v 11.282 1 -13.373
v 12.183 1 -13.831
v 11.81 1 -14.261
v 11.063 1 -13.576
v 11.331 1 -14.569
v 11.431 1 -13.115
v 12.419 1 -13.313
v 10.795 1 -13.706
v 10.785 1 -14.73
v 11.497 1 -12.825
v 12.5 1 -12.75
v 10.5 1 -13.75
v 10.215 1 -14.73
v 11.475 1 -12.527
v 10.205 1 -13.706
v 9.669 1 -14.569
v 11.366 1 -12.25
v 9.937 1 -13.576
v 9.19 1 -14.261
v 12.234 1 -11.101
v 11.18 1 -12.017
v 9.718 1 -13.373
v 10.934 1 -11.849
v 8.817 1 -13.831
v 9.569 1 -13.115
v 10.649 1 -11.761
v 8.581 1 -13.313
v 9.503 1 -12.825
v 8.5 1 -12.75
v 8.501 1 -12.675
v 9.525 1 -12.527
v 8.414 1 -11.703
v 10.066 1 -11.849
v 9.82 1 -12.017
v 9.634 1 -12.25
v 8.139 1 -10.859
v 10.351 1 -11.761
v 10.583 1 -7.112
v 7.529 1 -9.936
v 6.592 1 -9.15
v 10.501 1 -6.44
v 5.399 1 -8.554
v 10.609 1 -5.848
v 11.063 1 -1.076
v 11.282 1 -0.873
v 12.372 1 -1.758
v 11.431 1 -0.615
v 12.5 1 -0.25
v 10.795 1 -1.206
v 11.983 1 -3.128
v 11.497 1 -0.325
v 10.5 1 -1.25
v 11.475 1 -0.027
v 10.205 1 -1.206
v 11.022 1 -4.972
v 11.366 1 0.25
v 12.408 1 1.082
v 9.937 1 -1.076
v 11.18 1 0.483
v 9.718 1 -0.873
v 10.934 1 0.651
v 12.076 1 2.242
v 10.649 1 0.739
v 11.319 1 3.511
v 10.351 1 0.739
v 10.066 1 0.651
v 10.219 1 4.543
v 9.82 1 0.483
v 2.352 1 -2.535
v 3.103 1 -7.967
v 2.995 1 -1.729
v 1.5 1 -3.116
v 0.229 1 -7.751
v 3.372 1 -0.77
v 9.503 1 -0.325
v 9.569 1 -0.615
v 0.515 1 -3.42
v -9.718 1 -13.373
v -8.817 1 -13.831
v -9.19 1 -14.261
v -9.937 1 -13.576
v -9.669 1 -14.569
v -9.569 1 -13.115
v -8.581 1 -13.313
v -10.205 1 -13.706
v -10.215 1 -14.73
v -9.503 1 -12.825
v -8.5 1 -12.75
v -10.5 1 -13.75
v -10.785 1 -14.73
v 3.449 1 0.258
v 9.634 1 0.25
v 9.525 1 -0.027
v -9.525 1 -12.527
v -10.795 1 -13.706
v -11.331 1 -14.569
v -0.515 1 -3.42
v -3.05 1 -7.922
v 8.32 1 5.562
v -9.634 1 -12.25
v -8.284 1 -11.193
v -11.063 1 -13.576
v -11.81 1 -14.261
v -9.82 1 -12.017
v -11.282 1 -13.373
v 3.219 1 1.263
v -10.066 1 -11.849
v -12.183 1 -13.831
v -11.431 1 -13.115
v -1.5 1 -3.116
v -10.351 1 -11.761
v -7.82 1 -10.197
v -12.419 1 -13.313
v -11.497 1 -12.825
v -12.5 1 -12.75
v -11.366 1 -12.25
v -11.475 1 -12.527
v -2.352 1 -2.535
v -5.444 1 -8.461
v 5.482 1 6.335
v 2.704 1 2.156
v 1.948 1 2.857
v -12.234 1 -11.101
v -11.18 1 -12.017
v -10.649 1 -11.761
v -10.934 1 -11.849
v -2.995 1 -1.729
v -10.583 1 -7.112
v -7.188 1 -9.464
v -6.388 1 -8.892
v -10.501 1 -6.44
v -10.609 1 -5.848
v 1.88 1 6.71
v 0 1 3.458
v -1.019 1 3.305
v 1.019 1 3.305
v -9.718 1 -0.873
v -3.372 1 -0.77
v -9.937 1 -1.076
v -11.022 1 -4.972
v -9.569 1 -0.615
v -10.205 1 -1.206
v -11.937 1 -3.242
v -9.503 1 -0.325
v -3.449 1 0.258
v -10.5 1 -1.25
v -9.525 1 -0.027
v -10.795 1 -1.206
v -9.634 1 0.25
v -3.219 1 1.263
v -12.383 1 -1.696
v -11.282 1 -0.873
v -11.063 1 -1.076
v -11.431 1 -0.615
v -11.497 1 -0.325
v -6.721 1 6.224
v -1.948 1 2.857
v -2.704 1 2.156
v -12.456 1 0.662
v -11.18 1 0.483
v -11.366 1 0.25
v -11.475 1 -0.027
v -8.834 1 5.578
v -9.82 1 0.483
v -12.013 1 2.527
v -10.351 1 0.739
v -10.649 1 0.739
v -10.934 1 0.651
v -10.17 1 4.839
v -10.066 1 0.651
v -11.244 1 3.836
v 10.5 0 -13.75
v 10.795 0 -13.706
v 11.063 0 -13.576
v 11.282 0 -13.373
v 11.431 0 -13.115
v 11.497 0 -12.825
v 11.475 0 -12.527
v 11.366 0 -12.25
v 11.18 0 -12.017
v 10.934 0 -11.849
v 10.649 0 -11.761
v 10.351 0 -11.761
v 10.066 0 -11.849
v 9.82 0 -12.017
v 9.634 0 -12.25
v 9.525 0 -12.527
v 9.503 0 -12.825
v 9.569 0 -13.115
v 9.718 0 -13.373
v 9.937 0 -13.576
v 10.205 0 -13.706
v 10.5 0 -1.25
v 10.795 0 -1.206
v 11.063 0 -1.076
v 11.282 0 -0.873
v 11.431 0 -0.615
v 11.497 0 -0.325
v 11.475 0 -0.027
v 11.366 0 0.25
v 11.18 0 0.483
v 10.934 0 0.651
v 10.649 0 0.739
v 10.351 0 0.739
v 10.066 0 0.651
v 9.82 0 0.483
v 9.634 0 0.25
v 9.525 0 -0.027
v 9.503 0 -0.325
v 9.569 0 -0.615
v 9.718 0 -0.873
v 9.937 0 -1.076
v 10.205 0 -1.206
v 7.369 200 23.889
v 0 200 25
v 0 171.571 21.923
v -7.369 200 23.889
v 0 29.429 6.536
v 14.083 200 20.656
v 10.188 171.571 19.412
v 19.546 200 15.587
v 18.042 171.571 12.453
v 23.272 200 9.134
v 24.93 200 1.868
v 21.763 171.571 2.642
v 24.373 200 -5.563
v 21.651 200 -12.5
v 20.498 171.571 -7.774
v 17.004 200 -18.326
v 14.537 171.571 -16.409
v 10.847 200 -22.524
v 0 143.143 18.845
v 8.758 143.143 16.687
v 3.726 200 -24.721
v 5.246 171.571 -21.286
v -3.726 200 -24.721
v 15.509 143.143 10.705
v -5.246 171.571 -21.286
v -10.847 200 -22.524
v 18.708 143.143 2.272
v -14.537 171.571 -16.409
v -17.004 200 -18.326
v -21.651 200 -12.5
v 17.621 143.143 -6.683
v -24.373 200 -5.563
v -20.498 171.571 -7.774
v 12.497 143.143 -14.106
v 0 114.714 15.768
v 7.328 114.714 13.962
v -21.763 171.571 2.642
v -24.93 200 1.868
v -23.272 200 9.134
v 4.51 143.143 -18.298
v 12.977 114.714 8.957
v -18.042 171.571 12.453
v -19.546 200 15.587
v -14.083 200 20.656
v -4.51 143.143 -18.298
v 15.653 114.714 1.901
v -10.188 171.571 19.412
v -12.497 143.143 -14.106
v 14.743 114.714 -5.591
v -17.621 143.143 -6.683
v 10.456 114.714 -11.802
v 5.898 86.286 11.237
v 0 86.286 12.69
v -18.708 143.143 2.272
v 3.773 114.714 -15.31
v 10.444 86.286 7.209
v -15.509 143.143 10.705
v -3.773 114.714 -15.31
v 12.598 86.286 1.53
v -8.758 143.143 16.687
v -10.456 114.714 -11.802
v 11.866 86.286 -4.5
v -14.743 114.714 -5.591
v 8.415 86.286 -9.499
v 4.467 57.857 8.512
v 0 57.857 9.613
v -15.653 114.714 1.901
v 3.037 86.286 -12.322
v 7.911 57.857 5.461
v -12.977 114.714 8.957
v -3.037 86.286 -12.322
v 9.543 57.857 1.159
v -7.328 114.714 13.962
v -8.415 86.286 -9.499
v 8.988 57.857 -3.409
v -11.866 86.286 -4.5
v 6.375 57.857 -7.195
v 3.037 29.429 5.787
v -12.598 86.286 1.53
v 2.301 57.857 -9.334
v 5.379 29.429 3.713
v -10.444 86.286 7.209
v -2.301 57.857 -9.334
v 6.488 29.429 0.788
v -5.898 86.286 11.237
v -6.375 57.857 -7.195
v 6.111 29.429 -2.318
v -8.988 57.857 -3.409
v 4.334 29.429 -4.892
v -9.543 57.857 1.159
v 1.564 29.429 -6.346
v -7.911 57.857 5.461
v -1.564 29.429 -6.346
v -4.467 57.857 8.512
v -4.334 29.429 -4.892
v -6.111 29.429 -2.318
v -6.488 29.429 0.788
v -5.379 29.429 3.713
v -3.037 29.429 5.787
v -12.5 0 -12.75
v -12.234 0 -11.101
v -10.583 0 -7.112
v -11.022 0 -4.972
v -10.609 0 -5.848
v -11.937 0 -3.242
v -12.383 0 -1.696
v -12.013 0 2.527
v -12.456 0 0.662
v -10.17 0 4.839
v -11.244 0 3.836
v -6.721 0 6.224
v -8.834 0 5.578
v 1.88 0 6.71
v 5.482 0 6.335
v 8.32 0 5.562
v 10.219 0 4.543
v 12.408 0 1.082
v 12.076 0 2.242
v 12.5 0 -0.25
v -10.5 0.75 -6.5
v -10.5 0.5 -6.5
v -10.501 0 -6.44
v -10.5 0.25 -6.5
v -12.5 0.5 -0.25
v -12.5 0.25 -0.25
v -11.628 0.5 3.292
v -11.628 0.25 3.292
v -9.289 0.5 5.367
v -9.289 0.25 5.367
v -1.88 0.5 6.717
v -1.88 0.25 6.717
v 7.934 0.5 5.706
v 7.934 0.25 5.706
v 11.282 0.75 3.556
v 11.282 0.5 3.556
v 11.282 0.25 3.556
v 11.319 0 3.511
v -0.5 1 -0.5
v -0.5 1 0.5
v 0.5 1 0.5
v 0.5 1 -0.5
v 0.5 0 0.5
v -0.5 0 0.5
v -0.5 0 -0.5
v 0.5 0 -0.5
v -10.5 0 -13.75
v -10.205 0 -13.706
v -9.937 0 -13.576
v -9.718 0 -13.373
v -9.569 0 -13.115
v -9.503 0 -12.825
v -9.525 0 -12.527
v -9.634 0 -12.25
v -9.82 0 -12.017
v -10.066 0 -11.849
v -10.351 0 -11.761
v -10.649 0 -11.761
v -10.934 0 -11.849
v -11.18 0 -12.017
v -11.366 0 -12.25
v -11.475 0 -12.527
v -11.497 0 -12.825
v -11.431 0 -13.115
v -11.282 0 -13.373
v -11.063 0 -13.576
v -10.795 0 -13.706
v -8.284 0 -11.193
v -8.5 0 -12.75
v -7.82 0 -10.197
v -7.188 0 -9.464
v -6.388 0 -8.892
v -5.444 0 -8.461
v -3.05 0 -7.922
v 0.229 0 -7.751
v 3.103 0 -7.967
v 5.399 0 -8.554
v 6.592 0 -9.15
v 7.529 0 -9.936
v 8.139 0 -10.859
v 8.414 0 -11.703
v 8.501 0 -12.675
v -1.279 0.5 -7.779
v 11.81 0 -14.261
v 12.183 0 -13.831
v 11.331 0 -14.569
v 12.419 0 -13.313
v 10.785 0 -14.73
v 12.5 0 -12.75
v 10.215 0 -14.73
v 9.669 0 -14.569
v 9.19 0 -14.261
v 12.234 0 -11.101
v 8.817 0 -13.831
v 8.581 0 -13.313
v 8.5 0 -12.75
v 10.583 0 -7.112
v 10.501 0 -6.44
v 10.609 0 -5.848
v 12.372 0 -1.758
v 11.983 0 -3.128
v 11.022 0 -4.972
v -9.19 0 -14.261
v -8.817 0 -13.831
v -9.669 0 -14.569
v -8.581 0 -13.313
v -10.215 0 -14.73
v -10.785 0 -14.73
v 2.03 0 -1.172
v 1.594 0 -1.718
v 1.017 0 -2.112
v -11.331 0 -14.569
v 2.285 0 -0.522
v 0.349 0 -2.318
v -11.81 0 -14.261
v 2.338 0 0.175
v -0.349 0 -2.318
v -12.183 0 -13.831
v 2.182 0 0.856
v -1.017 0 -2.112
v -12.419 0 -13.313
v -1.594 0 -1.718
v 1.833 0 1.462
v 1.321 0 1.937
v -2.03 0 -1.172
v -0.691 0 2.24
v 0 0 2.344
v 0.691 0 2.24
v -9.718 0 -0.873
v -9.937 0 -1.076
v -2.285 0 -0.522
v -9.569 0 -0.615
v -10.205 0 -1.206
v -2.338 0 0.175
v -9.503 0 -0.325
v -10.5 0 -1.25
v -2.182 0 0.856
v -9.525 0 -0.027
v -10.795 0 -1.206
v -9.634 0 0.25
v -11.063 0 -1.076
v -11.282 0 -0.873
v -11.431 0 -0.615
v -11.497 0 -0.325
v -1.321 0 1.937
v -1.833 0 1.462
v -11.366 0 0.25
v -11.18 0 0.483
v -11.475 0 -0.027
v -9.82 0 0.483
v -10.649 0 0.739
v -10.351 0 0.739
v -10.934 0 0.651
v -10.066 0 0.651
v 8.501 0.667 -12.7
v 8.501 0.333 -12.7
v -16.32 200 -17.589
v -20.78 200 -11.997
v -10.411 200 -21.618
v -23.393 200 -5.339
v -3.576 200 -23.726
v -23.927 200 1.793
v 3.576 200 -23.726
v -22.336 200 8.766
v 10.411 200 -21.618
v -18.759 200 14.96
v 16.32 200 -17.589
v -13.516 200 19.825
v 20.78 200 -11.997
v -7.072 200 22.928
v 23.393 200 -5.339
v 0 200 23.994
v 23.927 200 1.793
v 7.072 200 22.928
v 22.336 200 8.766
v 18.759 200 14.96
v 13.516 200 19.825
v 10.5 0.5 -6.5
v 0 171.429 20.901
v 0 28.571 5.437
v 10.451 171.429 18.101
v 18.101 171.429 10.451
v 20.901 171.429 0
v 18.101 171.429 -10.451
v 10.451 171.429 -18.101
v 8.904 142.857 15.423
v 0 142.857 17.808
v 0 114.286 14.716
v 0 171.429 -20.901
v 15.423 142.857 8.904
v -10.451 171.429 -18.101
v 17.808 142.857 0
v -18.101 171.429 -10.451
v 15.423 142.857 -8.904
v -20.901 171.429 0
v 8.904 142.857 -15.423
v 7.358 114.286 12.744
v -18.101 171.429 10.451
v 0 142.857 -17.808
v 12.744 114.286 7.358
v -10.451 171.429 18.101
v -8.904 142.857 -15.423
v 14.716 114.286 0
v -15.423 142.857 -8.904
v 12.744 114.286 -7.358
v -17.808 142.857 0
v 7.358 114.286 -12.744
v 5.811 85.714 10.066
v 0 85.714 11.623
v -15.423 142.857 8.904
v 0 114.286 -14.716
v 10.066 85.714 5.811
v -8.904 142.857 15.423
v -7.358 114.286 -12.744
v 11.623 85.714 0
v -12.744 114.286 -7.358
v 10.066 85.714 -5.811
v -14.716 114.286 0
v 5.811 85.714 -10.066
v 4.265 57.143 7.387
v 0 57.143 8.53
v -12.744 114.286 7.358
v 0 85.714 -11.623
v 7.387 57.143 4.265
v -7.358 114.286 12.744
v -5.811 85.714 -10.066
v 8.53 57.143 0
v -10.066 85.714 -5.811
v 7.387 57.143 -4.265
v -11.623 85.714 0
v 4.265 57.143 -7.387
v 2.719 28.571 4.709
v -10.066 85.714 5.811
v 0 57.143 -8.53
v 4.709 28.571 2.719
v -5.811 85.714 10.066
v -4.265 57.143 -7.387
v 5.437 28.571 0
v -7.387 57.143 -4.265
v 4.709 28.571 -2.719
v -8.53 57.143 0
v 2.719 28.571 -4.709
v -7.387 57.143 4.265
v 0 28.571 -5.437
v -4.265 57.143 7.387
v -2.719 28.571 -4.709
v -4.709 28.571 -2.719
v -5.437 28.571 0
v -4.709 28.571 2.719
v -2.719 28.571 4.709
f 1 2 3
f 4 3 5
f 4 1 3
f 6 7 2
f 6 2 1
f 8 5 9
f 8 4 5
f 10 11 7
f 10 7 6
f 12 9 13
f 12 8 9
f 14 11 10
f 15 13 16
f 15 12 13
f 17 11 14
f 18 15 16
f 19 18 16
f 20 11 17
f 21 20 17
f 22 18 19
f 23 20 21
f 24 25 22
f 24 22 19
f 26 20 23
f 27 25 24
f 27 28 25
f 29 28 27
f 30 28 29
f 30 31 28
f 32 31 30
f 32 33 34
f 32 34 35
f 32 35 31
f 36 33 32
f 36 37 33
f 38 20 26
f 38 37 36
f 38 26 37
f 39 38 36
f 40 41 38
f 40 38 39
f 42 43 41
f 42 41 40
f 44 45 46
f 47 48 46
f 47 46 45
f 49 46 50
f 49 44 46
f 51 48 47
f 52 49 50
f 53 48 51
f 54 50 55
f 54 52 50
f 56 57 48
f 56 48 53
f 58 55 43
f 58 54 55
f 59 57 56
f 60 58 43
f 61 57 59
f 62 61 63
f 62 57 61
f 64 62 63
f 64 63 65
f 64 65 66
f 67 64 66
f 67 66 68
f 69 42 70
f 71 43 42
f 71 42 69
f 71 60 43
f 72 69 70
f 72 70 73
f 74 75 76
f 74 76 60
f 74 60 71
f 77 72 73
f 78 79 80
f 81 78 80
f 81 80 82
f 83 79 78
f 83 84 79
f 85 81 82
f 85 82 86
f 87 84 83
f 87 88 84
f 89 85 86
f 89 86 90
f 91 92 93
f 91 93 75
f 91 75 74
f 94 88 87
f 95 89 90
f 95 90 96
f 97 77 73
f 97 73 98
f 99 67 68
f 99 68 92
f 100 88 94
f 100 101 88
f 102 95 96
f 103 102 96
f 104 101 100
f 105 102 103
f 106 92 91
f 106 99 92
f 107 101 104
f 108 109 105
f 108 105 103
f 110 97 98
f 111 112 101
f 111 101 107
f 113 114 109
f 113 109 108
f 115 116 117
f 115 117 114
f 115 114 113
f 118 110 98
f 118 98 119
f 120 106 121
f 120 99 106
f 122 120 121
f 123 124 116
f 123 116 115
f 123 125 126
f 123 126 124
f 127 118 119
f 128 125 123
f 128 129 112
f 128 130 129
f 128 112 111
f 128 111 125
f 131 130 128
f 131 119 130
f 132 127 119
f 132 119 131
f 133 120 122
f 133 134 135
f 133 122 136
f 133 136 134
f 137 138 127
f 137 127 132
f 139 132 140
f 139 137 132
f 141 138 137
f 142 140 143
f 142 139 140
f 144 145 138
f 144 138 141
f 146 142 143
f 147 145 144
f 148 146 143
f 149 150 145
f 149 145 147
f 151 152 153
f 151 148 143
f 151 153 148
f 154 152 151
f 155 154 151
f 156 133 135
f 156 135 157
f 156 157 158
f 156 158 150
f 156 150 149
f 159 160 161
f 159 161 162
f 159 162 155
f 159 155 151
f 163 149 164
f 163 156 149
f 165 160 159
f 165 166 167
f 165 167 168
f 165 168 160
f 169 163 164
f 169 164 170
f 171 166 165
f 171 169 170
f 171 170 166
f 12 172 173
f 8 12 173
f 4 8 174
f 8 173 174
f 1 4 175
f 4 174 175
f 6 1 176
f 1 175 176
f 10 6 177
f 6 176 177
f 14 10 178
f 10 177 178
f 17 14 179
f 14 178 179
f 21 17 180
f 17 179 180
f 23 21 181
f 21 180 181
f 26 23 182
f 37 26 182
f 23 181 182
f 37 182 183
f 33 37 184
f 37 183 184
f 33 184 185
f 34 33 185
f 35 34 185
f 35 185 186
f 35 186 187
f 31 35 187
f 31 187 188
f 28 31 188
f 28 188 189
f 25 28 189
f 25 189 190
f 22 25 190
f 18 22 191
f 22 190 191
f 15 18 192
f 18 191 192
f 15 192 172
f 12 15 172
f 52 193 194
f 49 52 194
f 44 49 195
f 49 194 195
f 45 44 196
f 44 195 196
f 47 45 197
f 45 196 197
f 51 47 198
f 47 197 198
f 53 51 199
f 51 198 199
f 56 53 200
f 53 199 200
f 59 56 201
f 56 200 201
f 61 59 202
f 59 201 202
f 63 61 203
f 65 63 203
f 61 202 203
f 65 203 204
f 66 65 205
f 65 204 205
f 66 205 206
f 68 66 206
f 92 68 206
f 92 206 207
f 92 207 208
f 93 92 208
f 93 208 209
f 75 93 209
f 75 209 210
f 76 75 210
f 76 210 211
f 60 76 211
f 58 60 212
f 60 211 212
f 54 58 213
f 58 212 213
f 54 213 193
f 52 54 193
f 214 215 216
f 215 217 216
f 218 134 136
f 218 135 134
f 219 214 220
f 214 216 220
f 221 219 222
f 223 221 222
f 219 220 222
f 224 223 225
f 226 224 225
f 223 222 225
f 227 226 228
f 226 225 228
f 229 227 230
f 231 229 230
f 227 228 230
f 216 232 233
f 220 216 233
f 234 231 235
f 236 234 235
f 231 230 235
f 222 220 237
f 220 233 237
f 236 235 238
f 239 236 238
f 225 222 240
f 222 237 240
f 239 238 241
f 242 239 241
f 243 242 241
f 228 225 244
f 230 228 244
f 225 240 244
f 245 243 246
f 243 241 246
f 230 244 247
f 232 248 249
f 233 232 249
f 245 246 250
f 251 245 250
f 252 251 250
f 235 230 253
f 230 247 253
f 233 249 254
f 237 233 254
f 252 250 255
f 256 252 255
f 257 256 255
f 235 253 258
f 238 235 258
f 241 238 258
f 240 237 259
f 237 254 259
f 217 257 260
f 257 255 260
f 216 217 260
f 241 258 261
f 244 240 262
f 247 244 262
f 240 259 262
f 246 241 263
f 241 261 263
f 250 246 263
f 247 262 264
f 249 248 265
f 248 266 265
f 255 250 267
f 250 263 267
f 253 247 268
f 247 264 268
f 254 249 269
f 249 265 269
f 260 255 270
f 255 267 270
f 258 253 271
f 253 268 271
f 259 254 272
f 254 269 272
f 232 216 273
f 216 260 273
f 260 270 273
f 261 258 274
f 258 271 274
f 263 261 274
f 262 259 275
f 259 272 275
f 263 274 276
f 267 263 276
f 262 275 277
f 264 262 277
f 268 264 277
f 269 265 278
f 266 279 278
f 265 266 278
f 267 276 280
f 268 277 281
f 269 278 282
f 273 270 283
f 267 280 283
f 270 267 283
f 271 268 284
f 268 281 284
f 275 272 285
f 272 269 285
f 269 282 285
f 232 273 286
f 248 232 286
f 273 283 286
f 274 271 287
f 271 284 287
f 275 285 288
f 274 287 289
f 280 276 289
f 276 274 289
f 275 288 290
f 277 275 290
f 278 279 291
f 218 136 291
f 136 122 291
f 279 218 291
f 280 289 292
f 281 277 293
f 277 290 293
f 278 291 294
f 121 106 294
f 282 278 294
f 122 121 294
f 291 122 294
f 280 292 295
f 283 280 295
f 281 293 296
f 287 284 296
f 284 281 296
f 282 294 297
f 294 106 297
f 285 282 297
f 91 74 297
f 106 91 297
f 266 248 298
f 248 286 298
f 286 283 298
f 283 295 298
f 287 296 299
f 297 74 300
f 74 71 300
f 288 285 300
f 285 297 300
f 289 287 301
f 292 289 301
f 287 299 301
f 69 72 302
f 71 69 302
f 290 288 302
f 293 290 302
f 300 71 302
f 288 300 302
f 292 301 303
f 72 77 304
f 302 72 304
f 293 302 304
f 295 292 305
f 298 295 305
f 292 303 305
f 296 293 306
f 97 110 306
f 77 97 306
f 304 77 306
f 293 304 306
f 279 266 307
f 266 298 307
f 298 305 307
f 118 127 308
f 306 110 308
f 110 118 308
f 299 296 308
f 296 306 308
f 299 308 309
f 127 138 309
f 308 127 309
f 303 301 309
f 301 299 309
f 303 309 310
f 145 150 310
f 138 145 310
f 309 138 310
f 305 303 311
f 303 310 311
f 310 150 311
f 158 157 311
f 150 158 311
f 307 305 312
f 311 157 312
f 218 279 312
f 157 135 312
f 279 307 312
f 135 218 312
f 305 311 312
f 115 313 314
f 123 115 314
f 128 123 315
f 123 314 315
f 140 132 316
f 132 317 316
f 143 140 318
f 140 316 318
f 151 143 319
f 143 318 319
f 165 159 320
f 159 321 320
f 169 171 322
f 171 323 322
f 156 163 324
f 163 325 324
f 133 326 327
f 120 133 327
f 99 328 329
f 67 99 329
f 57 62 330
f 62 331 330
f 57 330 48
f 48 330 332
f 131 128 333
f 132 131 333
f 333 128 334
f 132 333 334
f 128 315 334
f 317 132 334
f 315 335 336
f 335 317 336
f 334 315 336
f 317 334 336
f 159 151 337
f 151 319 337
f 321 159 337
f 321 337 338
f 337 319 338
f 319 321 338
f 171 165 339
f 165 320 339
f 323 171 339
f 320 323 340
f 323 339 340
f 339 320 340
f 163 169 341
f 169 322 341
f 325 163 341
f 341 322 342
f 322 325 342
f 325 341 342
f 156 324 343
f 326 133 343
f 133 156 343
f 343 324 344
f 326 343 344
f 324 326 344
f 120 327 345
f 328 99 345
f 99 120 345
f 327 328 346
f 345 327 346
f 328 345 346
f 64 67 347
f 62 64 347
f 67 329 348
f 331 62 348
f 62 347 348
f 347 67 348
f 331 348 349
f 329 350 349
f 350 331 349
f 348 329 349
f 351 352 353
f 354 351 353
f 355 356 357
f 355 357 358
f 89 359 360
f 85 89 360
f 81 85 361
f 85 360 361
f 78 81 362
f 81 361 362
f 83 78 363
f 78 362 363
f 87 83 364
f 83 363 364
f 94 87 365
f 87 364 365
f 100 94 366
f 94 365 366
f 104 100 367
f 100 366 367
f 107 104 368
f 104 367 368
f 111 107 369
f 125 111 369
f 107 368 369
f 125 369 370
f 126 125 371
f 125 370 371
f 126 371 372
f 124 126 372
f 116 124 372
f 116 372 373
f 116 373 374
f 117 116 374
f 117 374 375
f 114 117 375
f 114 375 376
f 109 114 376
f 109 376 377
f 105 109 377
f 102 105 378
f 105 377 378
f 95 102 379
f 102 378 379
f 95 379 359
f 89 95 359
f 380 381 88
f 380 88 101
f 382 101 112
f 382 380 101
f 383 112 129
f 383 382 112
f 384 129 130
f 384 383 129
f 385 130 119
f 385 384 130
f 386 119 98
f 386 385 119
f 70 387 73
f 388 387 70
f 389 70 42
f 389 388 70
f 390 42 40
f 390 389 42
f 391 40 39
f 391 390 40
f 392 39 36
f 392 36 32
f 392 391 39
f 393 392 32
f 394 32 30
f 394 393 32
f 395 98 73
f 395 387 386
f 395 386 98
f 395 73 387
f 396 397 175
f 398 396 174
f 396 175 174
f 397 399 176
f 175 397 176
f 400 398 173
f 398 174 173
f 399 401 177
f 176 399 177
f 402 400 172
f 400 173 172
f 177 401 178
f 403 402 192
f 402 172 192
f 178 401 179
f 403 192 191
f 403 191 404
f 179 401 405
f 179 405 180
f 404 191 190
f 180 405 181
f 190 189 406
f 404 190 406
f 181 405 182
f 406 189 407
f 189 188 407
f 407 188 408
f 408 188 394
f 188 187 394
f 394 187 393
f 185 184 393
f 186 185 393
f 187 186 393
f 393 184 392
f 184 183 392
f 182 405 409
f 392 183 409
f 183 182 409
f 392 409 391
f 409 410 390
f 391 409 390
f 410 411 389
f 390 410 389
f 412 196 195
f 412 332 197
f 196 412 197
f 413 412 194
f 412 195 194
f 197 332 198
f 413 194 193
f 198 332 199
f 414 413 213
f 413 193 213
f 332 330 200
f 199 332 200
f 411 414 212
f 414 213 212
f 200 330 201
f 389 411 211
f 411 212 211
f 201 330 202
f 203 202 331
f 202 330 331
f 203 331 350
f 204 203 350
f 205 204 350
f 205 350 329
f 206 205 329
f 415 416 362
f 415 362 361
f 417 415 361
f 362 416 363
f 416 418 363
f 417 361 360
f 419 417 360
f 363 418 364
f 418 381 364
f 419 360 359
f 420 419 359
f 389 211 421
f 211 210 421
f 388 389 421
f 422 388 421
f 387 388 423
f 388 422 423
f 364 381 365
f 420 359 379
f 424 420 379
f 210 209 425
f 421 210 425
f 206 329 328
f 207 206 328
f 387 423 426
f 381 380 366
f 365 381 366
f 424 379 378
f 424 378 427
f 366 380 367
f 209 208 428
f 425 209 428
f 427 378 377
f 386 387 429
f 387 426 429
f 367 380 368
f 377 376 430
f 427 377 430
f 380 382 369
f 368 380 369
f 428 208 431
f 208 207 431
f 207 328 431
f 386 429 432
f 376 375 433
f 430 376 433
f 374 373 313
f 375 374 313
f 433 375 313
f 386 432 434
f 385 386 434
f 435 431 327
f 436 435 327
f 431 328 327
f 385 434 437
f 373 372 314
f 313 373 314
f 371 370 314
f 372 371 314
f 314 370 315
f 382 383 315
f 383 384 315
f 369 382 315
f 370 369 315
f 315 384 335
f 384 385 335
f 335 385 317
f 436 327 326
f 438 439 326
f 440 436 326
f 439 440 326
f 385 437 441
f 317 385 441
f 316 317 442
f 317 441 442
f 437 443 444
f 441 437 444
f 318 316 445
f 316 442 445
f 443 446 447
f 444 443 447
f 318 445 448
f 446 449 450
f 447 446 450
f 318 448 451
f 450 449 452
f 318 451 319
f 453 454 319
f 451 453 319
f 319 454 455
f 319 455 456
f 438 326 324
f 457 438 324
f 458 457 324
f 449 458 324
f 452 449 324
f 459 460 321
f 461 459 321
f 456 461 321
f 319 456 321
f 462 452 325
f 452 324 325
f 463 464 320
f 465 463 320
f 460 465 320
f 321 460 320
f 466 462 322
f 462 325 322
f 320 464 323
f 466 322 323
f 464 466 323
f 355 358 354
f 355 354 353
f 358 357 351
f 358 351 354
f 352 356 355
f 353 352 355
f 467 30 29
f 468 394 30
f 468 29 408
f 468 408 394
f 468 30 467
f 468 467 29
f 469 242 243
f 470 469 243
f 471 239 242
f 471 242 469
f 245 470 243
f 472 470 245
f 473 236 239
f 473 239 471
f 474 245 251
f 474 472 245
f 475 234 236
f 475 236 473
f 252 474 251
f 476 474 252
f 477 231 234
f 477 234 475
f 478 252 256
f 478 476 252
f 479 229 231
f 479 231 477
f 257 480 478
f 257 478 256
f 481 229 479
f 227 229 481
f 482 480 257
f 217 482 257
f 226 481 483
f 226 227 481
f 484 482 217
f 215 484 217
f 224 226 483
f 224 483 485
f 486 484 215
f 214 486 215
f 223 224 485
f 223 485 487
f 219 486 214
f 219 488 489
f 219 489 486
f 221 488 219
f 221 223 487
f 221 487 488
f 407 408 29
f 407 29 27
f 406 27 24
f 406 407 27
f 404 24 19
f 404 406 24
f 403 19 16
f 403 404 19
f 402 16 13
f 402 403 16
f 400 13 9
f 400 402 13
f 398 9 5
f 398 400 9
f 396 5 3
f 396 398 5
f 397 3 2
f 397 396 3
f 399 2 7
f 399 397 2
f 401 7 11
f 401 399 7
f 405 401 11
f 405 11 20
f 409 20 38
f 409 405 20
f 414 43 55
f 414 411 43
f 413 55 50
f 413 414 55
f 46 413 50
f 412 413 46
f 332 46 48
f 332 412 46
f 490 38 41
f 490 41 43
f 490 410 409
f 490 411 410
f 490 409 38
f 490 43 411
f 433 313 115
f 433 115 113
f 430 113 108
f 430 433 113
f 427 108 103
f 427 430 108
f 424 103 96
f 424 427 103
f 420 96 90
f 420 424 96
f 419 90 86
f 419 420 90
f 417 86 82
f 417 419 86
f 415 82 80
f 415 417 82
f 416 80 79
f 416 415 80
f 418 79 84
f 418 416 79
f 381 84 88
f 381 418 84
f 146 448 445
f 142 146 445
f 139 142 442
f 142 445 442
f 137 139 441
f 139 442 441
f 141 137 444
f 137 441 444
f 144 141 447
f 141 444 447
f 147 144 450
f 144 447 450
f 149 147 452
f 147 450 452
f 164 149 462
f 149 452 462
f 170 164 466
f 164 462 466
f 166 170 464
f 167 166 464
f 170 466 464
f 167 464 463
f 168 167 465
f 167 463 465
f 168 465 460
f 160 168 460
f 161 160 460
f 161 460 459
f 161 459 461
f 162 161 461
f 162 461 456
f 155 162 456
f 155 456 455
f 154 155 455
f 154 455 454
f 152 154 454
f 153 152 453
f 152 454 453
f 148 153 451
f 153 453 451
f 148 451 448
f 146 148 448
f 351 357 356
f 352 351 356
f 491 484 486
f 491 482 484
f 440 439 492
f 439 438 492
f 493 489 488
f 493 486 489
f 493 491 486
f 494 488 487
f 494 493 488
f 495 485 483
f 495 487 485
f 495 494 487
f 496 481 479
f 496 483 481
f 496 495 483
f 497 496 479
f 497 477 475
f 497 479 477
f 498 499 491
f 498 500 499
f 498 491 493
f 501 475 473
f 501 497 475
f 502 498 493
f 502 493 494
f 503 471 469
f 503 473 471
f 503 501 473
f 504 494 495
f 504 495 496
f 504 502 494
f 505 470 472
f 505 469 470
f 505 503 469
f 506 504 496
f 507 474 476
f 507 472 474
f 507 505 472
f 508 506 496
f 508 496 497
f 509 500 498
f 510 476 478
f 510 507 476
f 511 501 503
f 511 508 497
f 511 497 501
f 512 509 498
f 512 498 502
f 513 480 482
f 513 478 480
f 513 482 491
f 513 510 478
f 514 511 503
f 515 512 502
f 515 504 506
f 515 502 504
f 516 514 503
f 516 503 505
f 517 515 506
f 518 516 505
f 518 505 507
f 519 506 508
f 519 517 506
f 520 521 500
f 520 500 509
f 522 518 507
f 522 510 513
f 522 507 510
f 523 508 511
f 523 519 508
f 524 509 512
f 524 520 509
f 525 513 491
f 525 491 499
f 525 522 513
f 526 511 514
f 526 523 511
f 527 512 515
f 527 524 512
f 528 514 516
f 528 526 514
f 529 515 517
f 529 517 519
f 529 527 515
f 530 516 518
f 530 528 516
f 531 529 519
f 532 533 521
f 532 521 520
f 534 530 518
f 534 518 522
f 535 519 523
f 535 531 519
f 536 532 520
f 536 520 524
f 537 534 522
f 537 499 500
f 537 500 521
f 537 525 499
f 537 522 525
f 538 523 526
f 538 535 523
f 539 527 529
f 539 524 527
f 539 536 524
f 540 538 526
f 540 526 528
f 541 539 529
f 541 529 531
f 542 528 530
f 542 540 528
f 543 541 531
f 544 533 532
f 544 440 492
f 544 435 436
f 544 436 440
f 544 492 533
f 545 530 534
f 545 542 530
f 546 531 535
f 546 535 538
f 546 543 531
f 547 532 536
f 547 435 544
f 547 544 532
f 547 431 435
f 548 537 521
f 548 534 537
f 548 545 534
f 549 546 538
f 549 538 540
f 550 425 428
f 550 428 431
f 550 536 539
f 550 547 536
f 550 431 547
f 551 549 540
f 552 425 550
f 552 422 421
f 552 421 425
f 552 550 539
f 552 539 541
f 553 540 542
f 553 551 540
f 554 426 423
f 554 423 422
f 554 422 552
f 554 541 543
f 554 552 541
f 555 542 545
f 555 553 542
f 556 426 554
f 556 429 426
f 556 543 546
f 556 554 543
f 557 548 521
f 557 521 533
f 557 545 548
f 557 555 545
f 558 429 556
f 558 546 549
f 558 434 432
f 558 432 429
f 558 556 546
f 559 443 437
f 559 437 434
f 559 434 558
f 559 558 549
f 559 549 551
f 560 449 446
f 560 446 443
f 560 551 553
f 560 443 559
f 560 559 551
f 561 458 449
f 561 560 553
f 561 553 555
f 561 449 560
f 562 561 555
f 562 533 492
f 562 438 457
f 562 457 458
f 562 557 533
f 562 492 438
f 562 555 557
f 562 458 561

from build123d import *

# Parameters (mm, degrees)
SKETCH1_R           = 25
BOSS_EXTRUDE1_DEPTH = 200
SHELL1_T            = -1
SKETCH4_W           = 1
SKETCH4_H           = 1
BOSS_EXTRUDE2_DEPTH = 1
SKETCH5_R           = 1
SKETCH5_R_2         = 3.35
BOSS_EXTRUDE3_DEPTH = 1


with BuildPart() as part:
    # Sketch1 → Boss-Extrude1 (new body)
    with BuildSketch(Plane(origin=(0, 0, 0), x_dir=(1, 0, 0), z_dir=(0, 1, 0))):
        with Locations(Location((0, 0, 0), (0, 0, 270))):
            Circle(SKETCH1_R)
    extrude(amount=BOSS_EXTRUDE1_DEPTH)

    # Sketch2 → Cut-Revolve1 (revolve, cut)
    with BuildSketch(Plane.XY, mode=Mode.PRIVATE) as cut_revolve1_sk:
        Polygon((-25, 200), (-3.35, 0), (-25, 0), align=None)
    revolve(cut_revolve1_sk.sketch.rotate(Axis((0, 0, 0), (0, 1, 0)), 90), axis=Axis((0, 0, 0), (0, 1, 0)), mode=Mode.SUBTRACT)

    # Shell1
    shell1_openings = [part.faces().sort_by_distance(p)[0] for p in [
        (0, 200, 0),
        (0, 0, 0),
    ]]
    offset(amount=SHELL1_T, openings=shell1_openings, kind=Kind.INTERSECTION)

    # Sketch5 → Boss-Extrude3 (add)
    with BuildSketch(Plane.XZ):
        with BuildLine():
            add(Edge.make_bspline(
                [(-12.5, -12.75), (-12.5, -10.276529653), (-8.5, -5.918139103), (-12.5, -3.88719214), (-12.5, -0.25)],
                knots=[0, 0, 0, 0, 0.5, 1, 1, 1, 1], degree=3))
            ThreePointArc((-12.5, -12.75), (-10.5, -14.75), (-8.5, -12.75))
            add(Edge.make_bspline(
                [(-8.5, -12.75), (-8.5, -8.812678575), (-0.936323636, -6.901749471), (8.551571166, -8.386496121), (8.501401516, -12.675139452)],
                knots=[0, 0, 0, 0, 0.45, 0.996833123, 0.996833123, 0.996833123, 0.996833123], degree=3))
            add(Edge.make_bspline(
                [(8.501401516, -12.675139452), (8.501110969, -12.699976289), (8.500644174, -12.724929646), (8.5, -12.75)],
                knots=[0.996833123, 0.996833123, 0.996833123, 0.996833123, 1, 1, 1, 1], degree=3))
            ThreePointArc((8.5, -12.75), (10.5, -14.75), (12.5, -12.75))
            add(Edge.make_bspline(
                [(12.5, -12.75), (12.5, -10.276529653), (8.5, -5.918139103), (12.5, -3.88719214), (12.5, -0.25)],
                knots=[0, 0, 0, 0, 0.5, 1, 1, 1, 1], degree=3))
            add(Edge.make_bspline(
                [(-12.5, -0.25), (-12.5, 5.628170091), (-1.338084599, 7.628919255), (12.65819275, 6.1139914), (12.5, -0.25)],
                knots=[0, 0, 0, 0, 0.45, 1, 1, 1, 1], degree=3))
        make_face()
        with Locations(Location((-10.5, -12.75, 0), (0, 0, 270))):
            Circle(SKETCH5_R, mode=Mode.SUBTRACT)
        with Locations(Location((10.5, -12.75, 0), (0, 0, 270))):
            Circle(SKETCH5_R, mode=Mode.SUBTRACT)
        with Locations(Location((-10.5, -0.25, 0), (0, 0, 270))):
            Circle(SKETCH5_R, mode=Mode.SUBTRACT)
        Circle(SKETCH5_R_2, mode=Mode.SUBTRACT)
        with Locations(Location((10.5, -0.25, 0), (0, 0, 270))):
            Circle(SKETCH5_R, mode=Mode.SUBTRACT)
    extrude(amount=-BOSS_EXTRUDE3_DEPTH)


with BuildPart() as body_2:
    # Sketch4 → Boss-Extrude2 (new body)
    with BuildSketch(Plane.XZ):
        Rectangle(SKETCH4_W, SKETCH4_H)
    extrude(amount=-BOSS_EXTRUDE2_DEPTH)


solid = Compound([part.part, body_2.part])
